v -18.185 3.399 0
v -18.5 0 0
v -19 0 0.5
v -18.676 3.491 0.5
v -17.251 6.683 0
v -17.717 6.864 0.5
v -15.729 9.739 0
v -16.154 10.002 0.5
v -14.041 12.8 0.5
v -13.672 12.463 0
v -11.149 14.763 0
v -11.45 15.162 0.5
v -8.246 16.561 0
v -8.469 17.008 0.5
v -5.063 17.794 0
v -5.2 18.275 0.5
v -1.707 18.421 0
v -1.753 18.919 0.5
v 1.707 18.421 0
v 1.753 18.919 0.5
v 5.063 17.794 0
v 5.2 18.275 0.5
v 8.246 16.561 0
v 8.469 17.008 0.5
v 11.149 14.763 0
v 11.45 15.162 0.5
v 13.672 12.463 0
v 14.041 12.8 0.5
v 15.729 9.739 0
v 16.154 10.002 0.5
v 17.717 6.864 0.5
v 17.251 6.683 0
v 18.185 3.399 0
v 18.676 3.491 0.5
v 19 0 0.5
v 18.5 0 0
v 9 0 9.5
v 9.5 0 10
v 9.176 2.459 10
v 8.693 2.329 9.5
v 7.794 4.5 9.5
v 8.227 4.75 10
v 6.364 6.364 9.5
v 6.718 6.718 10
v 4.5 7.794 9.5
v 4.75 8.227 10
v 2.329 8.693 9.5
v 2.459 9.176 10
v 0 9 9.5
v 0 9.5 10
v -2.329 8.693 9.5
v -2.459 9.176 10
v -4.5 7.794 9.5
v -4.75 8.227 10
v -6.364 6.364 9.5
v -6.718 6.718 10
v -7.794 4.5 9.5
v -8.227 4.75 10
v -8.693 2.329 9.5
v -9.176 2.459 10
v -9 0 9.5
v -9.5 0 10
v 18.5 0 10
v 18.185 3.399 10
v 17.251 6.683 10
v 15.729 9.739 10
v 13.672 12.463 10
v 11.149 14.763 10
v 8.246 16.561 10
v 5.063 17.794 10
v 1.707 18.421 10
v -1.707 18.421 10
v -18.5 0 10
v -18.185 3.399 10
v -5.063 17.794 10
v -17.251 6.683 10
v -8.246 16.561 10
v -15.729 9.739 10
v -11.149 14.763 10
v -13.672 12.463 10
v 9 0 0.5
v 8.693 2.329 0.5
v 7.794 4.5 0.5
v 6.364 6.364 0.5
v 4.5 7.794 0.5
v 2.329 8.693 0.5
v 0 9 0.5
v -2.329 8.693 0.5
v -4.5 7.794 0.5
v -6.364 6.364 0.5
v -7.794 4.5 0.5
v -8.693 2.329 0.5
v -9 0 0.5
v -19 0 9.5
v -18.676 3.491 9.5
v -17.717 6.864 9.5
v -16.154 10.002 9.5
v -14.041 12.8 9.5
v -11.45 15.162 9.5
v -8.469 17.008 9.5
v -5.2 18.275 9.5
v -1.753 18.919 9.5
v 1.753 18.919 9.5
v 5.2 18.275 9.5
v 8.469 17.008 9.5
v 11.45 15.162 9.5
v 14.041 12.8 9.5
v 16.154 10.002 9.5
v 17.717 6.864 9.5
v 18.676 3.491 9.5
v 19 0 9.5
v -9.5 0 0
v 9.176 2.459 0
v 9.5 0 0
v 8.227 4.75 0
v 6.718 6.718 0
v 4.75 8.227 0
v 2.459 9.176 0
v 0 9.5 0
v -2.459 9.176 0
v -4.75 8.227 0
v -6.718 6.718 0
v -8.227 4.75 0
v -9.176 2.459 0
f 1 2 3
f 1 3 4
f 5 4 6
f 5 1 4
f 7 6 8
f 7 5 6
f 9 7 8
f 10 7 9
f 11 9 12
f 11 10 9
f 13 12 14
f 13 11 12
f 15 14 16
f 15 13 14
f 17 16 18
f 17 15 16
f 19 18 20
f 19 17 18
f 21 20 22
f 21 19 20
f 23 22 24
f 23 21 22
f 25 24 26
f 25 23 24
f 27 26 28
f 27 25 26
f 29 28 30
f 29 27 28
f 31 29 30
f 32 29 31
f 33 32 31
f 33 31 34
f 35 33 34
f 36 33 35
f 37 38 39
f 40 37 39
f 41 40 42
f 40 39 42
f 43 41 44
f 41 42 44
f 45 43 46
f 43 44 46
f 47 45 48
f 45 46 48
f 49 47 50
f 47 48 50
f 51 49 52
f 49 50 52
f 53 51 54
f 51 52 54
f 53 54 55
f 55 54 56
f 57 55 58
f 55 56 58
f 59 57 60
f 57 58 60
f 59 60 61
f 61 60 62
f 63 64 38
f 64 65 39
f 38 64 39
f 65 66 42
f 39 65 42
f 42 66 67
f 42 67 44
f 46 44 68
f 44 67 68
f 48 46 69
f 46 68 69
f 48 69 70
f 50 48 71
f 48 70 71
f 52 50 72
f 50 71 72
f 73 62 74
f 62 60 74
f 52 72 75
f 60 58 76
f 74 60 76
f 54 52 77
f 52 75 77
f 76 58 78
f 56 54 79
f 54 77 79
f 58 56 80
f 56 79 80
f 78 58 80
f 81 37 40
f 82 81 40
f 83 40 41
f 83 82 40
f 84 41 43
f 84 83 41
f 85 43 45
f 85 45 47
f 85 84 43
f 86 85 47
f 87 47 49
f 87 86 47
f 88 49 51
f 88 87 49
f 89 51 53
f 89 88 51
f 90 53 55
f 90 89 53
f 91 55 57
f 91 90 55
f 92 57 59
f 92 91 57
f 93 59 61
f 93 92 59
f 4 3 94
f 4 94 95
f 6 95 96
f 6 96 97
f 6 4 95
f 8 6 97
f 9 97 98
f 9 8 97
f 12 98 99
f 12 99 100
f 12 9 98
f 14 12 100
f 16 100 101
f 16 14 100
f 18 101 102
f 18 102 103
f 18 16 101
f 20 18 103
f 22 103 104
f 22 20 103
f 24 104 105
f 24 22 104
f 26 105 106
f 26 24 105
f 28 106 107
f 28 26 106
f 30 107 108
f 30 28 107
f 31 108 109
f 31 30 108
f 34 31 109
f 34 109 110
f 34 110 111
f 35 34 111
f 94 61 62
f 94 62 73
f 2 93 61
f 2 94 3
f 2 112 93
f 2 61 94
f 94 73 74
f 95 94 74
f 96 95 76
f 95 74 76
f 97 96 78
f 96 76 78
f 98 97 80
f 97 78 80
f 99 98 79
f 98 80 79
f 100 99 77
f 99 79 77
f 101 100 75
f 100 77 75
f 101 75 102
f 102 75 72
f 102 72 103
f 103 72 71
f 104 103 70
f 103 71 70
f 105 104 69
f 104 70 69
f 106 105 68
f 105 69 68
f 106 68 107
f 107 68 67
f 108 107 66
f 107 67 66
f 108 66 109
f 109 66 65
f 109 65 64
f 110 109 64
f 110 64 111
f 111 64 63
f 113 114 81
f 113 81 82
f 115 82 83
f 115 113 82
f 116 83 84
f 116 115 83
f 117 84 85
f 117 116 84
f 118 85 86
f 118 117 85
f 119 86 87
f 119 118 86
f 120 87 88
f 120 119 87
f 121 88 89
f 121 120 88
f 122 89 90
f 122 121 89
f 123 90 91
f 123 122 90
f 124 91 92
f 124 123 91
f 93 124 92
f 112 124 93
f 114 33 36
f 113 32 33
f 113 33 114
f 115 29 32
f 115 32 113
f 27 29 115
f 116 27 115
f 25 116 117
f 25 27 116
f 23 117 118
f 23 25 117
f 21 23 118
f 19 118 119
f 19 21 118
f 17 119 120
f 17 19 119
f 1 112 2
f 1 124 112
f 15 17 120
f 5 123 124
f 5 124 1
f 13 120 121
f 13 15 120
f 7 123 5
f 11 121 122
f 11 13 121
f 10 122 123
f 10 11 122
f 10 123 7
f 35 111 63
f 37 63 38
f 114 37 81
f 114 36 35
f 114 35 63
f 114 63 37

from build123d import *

# Parameters (mm, degrees)
BOSS_EXTRUDE1_DEPTH = 10
CHAMFER1_SIZE       = 0.5


with BuildPart() as part:
    # Sketch1 → Boss-Extrude1 (new body)
    with BuildSketch(Plane.XY):
        with BuildLine():
            Line((-9, 0), (-19, 0))
            ThreePointArc((-19, 0), (0, 19), (19, 0))
            Line((19, 0), (9, 0))
            ThreePointArc((9, 0), (0, 9), (-9, 0))
        make_face()
    extrude(amount=BOSS_EXTRUDE1_DEPTH)

    # Chamfer1
    chamfer1_edges = [part.edges().sort_by_distance(p)[0] for p in [
        (0, 19, 10),
        (0, 9, 10),
        (0, 19, 0),
        (0, 9, 0),
    ]]
    chamfer(chamfer1_edges, length=CHAMFER1_SIZE)


solid = part.part
